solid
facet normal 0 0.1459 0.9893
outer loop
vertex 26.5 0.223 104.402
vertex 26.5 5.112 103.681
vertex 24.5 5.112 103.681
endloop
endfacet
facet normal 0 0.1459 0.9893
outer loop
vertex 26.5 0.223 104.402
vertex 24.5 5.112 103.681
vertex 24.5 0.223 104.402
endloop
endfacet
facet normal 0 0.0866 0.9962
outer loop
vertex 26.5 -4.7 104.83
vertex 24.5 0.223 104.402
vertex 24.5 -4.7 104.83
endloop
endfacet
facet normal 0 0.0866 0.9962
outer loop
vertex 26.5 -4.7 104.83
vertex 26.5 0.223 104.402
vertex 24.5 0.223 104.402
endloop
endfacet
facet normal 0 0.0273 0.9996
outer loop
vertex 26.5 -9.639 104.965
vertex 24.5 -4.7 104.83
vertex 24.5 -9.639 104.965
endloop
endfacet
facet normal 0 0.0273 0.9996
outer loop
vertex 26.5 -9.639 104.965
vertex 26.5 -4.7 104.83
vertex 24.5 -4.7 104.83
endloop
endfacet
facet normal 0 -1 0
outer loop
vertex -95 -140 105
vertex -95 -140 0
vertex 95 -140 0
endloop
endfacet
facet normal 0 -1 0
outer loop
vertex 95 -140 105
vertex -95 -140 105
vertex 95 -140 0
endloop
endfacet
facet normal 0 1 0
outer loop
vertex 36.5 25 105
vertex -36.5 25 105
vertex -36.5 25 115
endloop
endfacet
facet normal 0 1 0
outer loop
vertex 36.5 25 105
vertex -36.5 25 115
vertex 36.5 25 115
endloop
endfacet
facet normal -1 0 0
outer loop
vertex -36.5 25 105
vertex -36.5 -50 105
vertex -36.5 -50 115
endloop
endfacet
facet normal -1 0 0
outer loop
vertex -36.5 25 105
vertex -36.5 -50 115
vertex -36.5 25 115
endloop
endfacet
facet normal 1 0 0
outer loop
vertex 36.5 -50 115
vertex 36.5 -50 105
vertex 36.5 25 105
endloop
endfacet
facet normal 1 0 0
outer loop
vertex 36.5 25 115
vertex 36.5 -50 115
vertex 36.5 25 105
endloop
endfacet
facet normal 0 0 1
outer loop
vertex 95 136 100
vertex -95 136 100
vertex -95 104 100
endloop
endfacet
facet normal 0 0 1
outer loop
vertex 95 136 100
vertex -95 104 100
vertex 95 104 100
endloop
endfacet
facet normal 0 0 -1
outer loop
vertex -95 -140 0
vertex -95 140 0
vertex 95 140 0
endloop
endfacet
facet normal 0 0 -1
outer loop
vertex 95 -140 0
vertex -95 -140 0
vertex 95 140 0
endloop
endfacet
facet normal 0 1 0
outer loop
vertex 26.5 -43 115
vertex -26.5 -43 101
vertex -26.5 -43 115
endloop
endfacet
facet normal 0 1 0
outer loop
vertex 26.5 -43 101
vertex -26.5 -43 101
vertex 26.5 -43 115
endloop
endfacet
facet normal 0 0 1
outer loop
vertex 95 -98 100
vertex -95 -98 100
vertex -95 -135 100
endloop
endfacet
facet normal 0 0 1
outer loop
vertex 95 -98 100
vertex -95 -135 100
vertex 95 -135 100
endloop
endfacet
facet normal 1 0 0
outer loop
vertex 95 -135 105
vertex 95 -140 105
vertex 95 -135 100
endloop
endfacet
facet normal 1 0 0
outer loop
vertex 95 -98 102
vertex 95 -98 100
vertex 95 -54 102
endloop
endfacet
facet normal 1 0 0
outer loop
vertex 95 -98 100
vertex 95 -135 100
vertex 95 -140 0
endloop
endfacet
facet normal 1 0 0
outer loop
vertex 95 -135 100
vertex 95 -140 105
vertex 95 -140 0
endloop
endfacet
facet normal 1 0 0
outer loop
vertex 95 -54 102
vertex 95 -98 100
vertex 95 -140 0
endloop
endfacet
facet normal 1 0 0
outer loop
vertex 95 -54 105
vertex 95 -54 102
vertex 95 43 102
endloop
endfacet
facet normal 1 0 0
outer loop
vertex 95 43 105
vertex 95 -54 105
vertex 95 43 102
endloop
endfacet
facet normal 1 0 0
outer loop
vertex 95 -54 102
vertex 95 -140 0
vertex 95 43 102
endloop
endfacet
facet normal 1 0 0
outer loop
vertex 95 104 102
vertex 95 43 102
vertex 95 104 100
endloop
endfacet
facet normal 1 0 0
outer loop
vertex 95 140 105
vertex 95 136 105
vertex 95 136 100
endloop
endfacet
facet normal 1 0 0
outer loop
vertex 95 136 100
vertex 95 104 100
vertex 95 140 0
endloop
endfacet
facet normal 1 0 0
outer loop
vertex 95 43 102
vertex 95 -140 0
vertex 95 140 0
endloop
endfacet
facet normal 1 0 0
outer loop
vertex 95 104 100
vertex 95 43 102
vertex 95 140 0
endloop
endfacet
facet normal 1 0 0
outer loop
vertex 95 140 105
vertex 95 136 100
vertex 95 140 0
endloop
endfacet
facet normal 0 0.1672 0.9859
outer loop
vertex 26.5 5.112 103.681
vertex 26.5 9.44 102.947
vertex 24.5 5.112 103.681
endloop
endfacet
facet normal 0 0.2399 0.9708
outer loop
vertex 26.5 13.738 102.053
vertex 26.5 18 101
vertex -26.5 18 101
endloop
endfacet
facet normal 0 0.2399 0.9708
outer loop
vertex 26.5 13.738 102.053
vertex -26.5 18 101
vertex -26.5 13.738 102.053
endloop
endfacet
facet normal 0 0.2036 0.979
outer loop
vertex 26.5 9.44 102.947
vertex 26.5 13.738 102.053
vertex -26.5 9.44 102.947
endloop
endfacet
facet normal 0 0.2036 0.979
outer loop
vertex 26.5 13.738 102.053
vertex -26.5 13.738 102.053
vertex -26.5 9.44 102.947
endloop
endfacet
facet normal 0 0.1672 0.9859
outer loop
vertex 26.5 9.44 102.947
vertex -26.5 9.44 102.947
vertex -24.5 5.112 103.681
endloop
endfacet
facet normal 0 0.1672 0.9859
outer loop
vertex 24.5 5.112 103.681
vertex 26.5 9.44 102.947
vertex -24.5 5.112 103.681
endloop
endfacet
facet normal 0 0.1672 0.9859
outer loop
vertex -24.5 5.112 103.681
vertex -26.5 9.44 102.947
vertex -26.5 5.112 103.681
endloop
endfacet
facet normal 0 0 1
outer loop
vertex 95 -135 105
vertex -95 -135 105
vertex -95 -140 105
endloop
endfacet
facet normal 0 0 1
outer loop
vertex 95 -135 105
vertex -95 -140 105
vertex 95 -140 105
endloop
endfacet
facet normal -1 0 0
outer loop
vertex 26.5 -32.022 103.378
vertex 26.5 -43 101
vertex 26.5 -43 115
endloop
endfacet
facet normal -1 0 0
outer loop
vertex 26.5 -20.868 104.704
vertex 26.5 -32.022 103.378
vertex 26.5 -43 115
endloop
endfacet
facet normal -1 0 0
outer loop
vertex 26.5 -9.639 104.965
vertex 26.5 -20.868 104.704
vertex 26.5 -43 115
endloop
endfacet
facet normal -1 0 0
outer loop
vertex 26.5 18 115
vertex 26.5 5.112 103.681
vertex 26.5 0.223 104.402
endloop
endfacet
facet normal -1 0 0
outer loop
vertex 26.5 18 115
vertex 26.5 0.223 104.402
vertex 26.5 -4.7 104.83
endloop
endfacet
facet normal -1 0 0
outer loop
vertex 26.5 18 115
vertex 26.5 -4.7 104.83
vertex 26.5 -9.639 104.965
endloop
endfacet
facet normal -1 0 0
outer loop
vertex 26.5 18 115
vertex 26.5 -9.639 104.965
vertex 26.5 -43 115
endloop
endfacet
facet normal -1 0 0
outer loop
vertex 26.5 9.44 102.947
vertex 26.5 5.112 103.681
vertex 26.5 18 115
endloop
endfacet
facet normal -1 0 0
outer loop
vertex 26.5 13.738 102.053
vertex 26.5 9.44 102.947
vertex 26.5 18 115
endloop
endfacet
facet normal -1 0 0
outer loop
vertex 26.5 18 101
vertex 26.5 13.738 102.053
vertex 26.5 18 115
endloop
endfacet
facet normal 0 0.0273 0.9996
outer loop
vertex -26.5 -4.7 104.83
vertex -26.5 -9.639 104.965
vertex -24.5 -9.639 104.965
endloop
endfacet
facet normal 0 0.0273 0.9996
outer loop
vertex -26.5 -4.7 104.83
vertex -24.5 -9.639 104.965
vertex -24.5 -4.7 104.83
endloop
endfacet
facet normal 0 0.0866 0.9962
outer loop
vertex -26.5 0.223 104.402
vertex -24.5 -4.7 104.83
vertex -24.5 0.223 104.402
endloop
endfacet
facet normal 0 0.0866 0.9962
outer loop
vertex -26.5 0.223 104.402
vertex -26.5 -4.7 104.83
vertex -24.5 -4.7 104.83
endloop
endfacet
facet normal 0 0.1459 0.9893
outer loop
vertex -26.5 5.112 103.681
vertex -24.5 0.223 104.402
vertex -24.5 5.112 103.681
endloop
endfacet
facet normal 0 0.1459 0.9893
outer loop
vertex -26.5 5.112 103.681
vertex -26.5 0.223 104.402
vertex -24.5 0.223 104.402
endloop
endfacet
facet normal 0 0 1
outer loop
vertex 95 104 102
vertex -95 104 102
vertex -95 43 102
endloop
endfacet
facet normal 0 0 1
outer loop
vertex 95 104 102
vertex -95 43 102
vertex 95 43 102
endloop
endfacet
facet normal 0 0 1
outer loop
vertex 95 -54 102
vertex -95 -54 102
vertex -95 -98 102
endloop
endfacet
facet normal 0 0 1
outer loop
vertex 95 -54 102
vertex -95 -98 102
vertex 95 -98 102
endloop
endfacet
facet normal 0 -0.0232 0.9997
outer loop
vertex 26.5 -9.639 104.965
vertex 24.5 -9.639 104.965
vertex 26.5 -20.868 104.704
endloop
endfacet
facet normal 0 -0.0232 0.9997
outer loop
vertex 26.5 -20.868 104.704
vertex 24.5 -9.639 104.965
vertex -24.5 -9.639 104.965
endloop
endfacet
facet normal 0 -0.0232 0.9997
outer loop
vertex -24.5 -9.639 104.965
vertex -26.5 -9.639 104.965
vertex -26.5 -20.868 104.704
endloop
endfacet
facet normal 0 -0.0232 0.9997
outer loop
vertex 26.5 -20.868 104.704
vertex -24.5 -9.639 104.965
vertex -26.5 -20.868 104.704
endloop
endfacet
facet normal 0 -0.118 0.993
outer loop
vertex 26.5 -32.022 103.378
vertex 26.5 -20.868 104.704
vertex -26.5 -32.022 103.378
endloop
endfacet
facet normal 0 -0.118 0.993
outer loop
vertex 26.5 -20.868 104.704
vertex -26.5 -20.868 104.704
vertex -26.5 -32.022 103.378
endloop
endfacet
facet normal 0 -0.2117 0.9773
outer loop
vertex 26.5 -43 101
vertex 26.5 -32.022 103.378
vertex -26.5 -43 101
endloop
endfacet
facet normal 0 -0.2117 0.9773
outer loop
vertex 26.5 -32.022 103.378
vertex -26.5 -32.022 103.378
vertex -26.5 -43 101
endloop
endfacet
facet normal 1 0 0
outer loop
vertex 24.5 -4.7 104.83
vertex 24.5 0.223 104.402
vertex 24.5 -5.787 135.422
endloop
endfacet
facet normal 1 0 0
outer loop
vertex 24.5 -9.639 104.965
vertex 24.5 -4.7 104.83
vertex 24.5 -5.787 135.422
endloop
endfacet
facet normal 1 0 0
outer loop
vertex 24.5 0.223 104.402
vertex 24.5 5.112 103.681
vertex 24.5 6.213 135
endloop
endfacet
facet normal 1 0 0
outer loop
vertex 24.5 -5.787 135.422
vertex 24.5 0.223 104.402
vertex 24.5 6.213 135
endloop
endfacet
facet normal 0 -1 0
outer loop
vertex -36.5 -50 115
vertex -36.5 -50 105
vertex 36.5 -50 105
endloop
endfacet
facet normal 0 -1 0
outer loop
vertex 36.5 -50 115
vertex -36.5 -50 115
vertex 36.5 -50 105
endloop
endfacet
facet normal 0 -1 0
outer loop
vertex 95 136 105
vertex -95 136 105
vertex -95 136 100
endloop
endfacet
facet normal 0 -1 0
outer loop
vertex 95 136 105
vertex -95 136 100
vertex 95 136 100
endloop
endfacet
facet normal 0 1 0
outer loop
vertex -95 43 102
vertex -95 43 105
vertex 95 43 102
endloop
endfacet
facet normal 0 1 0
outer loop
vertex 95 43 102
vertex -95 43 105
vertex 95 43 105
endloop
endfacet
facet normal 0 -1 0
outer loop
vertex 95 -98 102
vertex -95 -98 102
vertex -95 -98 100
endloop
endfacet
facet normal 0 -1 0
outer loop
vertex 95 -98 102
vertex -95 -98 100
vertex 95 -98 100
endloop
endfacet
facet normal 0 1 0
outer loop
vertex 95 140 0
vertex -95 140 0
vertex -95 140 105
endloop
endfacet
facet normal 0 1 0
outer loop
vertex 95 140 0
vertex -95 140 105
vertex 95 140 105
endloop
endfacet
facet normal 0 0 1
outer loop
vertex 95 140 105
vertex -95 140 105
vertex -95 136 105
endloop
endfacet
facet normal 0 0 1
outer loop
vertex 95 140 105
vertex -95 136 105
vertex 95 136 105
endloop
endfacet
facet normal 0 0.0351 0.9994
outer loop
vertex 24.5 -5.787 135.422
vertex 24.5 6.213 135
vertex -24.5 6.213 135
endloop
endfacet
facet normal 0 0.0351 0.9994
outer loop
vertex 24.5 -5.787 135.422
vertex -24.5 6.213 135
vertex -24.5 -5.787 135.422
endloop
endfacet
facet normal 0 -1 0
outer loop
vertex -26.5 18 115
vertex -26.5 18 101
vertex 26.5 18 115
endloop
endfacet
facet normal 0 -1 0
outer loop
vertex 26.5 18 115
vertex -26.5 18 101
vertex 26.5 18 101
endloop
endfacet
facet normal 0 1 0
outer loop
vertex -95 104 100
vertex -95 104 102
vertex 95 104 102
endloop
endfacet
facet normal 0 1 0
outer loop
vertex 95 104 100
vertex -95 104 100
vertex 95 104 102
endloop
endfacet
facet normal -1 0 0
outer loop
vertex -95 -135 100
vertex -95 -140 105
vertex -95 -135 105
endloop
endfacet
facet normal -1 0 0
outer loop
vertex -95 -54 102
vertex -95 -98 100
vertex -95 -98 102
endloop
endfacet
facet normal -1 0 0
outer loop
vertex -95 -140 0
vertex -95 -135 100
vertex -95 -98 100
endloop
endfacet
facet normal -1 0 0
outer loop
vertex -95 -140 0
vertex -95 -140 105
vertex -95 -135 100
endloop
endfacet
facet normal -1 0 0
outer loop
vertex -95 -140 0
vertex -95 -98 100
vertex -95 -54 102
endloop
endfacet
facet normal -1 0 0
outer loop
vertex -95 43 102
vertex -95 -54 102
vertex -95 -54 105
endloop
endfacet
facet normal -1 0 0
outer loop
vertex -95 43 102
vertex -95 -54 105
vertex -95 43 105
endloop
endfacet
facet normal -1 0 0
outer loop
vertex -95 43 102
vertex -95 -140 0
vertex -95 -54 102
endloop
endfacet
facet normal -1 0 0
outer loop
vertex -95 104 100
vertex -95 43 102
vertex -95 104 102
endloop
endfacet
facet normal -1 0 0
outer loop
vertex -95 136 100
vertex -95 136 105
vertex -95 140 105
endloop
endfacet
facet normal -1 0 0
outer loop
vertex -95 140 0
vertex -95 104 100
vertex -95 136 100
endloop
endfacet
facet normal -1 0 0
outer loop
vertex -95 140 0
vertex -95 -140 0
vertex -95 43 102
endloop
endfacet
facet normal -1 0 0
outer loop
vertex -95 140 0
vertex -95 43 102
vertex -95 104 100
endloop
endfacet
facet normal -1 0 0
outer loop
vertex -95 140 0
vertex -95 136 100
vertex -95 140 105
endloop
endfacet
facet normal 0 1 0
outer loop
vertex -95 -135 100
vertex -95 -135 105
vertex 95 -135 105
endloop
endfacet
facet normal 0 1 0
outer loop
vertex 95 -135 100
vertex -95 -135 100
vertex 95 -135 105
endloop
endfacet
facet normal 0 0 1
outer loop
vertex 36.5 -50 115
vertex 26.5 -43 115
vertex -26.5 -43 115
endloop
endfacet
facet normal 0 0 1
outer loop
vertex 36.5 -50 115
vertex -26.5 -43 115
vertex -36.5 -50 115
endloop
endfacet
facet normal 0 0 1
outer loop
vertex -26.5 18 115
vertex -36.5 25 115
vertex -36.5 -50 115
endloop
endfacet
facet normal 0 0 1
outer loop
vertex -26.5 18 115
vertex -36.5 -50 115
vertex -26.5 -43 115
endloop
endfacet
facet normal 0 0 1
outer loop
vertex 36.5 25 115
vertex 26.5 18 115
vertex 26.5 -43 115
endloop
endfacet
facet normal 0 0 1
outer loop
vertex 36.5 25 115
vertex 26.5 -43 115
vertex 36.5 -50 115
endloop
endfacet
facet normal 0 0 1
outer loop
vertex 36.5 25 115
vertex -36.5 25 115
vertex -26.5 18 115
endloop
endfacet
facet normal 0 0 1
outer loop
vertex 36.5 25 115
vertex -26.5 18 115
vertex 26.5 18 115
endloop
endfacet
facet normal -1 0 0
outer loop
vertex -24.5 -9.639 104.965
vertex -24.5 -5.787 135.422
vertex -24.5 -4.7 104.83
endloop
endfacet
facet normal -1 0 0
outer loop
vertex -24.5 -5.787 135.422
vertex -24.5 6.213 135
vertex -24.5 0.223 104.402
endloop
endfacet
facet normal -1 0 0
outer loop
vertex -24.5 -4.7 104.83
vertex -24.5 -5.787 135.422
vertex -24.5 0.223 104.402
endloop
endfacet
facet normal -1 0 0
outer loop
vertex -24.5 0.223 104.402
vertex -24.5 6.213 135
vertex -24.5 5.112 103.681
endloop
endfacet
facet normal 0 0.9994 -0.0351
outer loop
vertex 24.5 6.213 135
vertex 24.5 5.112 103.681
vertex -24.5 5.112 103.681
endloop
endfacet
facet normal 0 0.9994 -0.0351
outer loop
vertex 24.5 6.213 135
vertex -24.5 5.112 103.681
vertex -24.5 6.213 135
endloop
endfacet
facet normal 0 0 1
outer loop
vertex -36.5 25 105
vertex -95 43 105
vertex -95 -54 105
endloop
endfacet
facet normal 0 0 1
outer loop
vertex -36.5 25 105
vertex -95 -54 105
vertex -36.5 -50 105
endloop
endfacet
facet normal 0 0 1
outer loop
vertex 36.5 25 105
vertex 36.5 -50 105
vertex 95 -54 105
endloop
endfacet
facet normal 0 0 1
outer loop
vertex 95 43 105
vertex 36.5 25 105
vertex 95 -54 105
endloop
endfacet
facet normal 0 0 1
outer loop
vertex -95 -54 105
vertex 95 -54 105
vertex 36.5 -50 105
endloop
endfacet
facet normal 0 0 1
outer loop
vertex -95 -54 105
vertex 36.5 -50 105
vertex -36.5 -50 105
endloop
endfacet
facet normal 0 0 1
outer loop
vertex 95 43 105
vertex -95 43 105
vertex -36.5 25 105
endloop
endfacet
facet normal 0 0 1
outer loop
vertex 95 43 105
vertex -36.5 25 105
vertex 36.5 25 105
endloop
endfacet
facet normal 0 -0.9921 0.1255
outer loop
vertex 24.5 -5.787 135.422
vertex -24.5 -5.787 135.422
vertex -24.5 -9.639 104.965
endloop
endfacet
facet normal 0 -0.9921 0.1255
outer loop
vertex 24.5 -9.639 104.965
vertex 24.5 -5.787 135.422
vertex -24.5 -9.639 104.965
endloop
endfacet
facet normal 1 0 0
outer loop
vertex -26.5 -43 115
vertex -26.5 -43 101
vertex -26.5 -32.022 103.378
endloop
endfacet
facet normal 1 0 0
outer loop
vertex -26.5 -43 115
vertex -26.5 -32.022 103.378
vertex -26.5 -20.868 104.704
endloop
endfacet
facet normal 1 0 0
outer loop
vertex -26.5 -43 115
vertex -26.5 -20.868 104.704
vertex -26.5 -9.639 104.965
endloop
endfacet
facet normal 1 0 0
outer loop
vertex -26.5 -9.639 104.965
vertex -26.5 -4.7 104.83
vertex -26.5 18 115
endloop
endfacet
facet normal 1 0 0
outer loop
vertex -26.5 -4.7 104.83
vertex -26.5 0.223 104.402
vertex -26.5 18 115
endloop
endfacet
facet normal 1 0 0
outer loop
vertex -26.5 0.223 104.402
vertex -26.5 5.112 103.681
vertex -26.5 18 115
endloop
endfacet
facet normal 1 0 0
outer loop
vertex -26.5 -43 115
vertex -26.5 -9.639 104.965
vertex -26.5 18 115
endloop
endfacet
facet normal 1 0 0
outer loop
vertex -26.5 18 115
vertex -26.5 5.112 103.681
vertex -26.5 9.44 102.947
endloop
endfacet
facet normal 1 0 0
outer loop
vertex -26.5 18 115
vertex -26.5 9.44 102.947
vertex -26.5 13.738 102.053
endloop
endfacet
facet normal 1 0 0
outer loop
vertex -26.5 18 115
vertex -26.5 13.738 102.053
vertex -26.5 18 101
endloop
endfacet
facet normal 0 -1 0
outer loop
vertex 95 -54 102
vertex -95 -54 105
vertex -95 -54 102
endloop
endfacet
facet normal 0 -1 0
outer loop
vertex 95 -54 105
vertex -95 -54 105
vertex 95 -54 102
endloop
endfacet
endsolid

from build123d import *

# Parameters (mm, degrees)
CROQUIS1_W              = 190
CROQUIS1_H              = 280
SALIENTE_EXTRUIR1_DEPTH = 105
CROQUIS2_W              = 73
CROQUIS2_H              = 75
CROQUIS2_W_2            = 53
CROQUIS2_H_2            = 61
SALIENTE_EXTRUIR2_DEPTH = 10
CROQUIS3_W              = 190
CROQUIS3_H              = 32
CORTAR_EXTRUIR1_DEPTH   = 5
CROQUIS4_W              = 190
CROQUIS4_H              = 61
CORTAR_EXTRUIR2_DEPTH   = 3
CORTAR_EXTRUIR3_DEPTH   = 53
SALIENTE_EXTRUIR3_DEPTH = 53
CORTAR_EXTRUIR4_DEPTH   = 2
CORTAR_EXTRUIR5_DEPTH   = 2
CROQUIS10_W             = 190
CROQUIS10_H             = 44
CORTAR_EXTRUIR6_DEPTH   = 3
CROQUIS11_W             = 190
CROQUIS11_H             = 37
CORTAR_EXTRUIR7_DEPTH   = 5


with BuildPart() as part:
    # Croquis1 → Saliente-Extruir1 (new body)
    with BuildSketch(Plane.XY):
        Rectangle(CROQUIS1_W, CROQUIS1_H)
    extrude(amount=SALIENTE_EXTRUIR1_DEPTH)

    # Croquis2 → Saliente-Extruir2 (add)
    with BuildSketch(Plane.XY.offset(105)):
        with Locations((0, -12.5)):
            Rectangle(CROQUIS2_W, CROQUIS2_H)
        with Locations((0, -12.5)):
            Rectangle(CROQUIS2_W_2, CROQUIS2_H_2, mode=Mode.SUBTRACT)
    extrude(amount=SALIENTE_EXTRUIR2_DEPTH)

    # Croquis3 → Cortar-Extruir1 (cut)
    with BuildSketch(Plane.XY.offset(105)):
        with Locations((0, 120)):
            Rectangle(CROQUIS3_W, CROQUIS3_H)
    extrude(amount=-CORTAR_EXTRUIR1_DEPTH, mode=Mode.SUBTRACT)

    # Croquis4 → Cortar-Extruir2 (cut)
    with BuildSketch(Plane.XY.offset(105)):
        with Locations((0, 73.5)):
            Rectangle(CROQUIS4_W, CROQUIS4_H)
    extrude(amount=-CORTAR_EXTRUIR2_DEPTH, mode=Mode.SUBTRACT)

    # Croquis6 → Cortar-Extruir3 (cut)
    with BuildSketch(Plane(origin=(-26.5, 0, 0), x_dir=(0, 0, -1), z_dir=(1, 0, 0))):
        with BuildLine():
            Line((-105, 18), (-101, 18))
            ThreePointArc((-101, 18), (-105, -12.5), (-101, -43))
            Line((-101, -43), (-105, -43))
            Line((-105, -43), (-107.940115758, -14.951898157))
            Line((-107.940115758, -14.951898157), (-105, 18))
        make_face()
    extrude(amount=CORTAR_EXTRUIR3_DEPTH, mode=Mode.SUBTRACT)

    # Croquis7 → Saliente-Extruir3 (add)
    with BuildSketch(Plane(origin=(-26.5, 0, 0), x_dir=(0, 0, -1), z_dir=(1, 0, 0))):
        with BuildLine():
            Line((-103.681451712, 5.111942251), (-135, 6.21315585))
            Line((-135, 6.21315585), (-135.421940476, -5.78684415))
            Line((-135.421940476, -5.78684415), (-104.965398794, -9.639204549))
            ThreePointArc((-104.965398794, -9.639204549), (-104.554477707, -2.24352023), (-103.681451712, 5.111942251))
        make_face()
    extrude(amount=SALIENTE_EXTRUIR3_DEPTH)

    # Croquis8 → Cortar-Extruir4 (cut)
    with BuildSketch(Plane(origin=(26.5, 0, 0), x_dir=(0, 0, -1), z_dir=(1, 0, 0))):
        with BuildLine():
            Line((-135, 6.21315585), (-103.681451712, 5.111942251))
            ThreePointArc((-103.681451712, 5.111942251), (-104.652420764, -2.234995218), (-104.965398794, -9.639204549))
            Line((-104.965398794, -9.639204549), (-135.421940476, -5.78684415))
            Line((-135.421940476, -5.78684415), (-135, 6.21315585))
        make_face()
    extrude(amount=-CORTAR_EXTRUIR4_DEPTH, mode=Mode.SUBTRACT)

    # Croquis9 → Cortar-Extruir5 (cut)
    with BuildSketch(Plane.ZY.offset(26.5)):
        with BuildLine():
            Line((103.681451712, 5.111942251), (135, 6.21315585))
            Line((135, 6.21315585), (135.421940476, -5.78684415))
            Line((135.421940476, -5.78684415), (104.965398794, -9.639204549))
            ThreePointArc((104.965398794, -9.639204549), (104.652420764, -2.234995218), (103.681451712, 5.111942251))
        make_face()
    extrude(amount=-CORTAR_EXTRUIR5_DEPTH, mode=Mode.SUBTRACT)

    # Croquis10 → Cortar-Extruir6 (cut)
    with BuildSketch(Plane.XY.offset(105)):
        with Locations((0, -76)):
            Rectangle(CROQUIS10_W, CROQUIS10_H)
    extrude(amount=-CORTAR_EXTRUIR6_DEPTH, mode=Mode.SUBTRACT)

    # Croquis11 → Cortar-Extruir7 (cut)
    with BuildSketch(Plane.XY.offset(105)):
        with Locations((0, -116.5)):
            Rectangle(CROQUIS11_W, CROQUIS11_H)
    extrude(amount=-CORTAR_EXTRUIR7_DEPTH, mode=Mode.SUBTRACT)


solid = part.part
